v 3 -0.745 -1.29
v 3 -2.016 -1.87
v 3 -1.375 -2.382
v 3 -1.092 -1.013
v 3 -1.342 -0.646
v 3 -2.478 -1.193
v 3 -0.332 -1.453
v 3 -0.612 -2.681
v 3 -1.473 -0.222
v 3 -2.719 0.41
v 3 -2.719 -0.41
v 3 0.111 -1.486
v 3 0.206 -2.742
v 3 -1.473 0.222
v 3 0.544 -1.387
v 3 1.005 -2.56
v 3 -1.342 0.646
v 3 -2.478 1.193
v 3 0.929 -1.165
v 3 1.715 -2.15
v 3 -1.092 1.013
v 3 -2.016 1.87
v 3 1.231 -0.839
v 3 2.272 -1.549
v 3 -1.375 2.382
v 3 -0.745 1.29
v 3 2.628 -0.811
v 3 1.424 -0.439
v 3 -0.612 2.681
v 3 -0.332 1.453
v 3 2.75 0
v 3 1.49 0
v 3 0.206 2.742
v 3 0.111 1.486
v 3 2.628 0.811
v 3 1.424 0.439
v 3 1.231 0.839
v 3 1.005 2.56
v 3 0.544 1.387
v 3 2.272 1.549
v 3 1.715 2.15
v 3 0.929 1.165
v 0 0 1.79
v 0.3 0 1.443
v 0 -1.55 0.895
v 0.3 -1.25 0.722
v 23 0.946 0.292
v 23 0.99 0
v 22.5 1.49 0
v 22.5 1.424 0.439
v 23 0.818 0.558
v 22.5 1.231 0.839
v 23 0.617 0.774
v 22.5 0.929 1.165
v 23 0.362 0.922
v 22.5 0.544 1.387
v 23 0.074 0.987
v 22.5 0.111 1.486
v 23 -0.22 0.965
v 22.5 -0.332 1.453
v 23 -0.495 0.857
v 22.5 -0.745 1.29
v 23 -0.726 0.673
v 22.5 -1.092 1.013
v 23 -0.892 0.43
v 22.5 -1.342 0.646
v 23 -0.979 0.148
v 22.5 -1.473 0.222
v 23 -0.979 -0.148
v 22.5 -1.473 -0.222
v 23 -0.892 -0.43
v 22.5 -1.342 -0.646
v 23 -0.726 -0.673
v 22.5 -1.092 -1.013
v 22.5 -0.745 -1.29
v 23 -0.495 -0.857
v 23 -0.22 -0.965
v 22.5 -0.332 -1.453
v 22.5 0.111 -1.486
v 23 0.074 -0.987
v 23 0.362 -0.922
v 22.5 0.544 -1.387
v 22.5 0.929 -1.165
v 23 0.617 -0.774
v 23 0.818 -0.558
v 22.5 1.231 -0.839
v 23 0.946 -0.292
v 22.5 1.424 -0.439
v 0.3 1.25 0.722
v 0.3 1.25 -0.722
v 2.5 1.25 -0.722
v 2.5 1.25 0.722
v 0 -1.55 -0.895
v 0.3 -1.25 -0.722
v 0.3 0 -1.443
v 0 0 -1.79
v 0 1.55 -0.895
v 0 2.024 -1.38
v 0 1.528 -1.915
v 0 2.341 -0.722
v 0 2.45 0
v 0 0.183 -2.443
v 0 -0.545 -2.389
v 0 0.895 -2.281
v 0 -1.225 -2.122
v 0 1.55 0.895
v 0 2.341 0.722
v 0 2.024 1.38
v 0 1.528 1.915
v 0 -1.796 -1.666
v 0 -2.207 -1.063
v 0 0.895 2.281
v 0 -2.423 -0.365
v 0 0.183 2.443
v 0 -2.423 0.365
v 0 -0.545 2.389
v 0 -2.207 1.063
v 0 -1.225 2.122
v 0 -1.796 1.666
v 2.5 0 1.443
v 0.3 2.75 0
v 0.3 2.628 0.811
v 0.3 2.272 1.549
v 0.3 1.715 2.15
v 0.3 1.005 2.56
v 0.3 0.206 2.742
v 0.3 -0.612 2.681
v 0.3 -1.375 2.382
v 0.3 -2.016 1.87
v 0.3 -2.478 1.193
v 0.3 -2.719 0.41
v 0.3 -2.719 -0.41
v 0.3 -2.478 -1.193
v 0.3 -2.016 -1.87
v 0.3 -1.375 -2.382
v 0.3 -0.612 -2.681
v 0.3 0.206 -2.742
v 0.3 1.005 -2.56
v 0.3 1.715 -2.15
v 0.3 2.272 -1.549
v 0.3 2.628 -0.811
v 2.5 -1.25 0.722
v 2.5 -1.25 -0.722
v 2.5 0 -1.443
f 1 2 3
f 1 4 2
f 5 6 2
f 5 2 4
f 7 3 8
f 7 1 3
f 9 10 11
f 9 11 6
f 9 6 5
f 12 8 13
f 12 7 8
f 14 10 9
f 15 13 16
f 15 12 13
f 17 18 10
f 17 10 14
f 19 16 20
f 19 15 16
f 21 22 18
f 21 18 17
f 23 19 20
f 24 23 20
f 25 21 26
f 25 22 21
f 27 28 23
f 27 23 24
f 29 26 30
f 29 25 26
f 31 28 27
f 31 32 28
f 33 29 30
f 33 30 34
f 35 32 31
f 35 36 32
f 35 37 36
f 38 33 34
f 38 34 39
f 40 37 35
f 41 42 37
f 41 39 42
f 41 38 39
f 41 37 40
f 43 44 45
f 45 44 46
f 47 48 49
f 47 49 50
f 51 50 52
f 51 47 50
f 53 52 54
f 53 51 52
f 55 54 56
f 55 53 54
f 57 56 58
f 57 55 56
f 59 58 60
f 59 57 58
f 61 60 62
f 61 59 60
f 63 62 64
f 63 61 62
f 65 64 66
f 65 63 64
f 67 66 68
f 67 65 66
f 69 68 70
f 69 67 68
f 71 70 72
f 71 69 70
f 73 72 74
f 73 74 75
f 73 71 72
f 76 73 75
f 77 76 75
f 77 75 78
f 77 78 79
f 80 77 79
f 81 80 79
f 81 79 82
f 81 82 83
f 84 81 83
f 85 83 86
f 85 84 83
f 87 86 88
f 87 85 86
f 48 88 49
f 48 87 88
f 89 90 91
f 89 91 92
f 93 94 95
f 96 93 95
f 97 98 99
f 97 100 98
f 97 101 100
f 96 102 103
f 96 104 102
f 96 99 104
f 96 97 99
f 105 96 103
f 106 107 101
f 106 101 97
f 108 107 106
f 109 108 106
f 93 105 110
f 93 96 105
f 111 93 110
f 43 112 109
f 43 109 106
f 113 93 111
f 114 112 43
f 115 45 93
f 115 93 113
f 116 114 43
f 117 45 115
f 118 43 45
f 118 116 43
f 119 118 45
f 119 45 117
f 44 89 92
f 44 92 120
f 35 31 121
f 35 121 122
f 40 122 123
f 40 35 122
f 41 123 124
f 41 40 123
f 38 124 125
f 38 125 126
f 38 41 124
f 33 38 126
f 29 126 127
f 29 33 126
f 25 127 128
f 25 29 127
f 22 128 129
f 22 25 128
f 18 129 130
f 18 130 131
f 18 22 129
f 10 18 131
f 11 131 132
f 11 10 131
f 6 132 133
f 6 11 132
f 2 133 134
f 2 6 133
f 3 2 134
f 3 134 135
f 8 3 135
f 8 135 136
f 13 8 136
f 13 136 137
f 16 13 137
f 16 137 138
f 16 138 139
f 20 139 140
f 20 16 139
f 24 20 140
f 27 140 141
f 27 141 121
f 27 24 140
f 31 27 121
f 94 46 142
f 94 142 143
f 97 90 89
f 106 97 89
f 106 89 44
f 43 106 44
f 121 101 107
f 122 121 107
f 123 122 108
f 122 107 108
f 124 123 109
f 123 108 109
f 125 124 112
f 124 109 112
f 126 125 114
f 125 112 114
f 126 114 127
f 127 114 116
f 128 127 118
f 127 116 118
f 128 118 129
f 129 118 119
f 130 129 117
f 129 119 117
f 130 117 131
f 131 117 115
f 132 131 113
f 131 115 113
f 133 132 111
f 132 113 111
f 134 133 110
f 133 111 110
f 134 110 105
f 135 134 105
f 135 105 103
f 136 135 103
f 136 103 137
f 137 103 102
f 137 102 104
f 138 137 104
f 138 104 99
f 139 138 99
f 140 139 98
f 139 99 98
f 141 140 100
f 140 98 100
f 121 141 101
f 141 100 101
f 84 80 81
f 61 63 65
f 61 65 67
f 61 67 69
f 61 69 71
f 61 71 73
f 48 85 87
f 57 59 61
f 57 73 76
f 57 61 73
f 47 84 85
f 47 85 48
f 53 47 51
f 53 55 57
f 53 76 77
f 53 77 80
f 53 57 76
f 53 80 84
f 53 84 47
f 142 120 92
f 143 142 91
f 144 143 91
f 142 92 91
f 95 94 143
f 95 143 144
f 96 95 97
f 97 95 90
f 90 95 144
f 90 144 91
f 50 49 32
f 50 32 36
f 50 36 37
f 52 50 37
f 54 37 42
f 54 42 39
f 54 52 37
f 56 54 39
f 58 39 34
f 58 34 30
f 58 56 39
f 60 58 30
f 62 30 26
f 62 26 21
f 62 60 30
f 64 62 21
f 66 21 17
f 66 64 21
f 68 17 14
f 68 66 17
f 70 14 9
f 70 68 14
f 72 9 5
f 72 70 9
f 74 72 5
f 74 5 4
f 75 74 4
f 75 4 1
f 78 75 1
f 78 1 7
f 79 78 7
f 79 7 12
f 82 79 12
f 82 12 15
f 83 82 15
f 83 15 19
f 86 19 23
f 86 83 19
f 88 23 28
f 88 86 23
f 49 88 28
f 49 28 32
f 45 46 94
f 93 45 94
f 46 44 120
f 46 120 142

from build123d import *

# Parameters (mm, degrees)
CHAMFER1_SIZE      = 0.5
CHAMFER2_SIZE      = 0.3
CUT_EXTRUDE1_DEPTH = 2.5
CHAMFER3_SIZE      = 0.3


with BuildPart() as part:
    # Sketch1 → Revolve1 (revolve)
    with BuildSketch(Plane.XY):
        Polygon((0, 0), (0, 2.75), (3, 2.75), (3, 1.49), (23, 1.49), (23, 0), align=None)
    revolve(axis=Axis((-88.705490849, 0, 0), (1, 0, 0)))

    # Chamfer1
    chamfer1_edges = [part.edges().sort_by_distance(p)[0] for p in [
        (23, -1.49, 0),
    ]]
    chamfer(chamfer1_edges, length=CHAMFER1_SIZE)

    # Chamfer2
    chamfer2_edges = [part.edges().sort_by_distance(p)[0] for p in [
        (0, -2.75, 0),
    ]]
    chamfer(chamfer2_edges, length=CHAMFER2_SIZE)

    # Sketch3 → Cut-Extrude1 (cut)
    with BuildSketch(Plane(origin=(0, 0, 0), x_dir=(0, 0, -1), z_dir=(1, 0, 0))):
        Polygon((-1.443375673, 0), (-0.721687836, -1.25), (0.721687836, -1.25), (1.443375673, 0), (0.721687836, 1.25), (-0.721687836, 1.25), align=None)
    extrude(amount=CUT_EXTRUDE1_DEPTH, mode=Mode.SUBTRACT)

    # Chamfer3
    chamfer3_edges = [part.edges().sort_by_distance(p)[0] for p in [
        (0, 0.625, 1.082531755),
        (0, -0.625, 1.082531755),
        (0, -1.25, 0),
        (0, -0.625, -1.082531755),
        (0, 0.625, -1.082531755),
        (0, 1.25, 0),
    ]]
    chamfer(chamfer3_edges, length=CHAMFER3_SIZE)


solid = part.part
